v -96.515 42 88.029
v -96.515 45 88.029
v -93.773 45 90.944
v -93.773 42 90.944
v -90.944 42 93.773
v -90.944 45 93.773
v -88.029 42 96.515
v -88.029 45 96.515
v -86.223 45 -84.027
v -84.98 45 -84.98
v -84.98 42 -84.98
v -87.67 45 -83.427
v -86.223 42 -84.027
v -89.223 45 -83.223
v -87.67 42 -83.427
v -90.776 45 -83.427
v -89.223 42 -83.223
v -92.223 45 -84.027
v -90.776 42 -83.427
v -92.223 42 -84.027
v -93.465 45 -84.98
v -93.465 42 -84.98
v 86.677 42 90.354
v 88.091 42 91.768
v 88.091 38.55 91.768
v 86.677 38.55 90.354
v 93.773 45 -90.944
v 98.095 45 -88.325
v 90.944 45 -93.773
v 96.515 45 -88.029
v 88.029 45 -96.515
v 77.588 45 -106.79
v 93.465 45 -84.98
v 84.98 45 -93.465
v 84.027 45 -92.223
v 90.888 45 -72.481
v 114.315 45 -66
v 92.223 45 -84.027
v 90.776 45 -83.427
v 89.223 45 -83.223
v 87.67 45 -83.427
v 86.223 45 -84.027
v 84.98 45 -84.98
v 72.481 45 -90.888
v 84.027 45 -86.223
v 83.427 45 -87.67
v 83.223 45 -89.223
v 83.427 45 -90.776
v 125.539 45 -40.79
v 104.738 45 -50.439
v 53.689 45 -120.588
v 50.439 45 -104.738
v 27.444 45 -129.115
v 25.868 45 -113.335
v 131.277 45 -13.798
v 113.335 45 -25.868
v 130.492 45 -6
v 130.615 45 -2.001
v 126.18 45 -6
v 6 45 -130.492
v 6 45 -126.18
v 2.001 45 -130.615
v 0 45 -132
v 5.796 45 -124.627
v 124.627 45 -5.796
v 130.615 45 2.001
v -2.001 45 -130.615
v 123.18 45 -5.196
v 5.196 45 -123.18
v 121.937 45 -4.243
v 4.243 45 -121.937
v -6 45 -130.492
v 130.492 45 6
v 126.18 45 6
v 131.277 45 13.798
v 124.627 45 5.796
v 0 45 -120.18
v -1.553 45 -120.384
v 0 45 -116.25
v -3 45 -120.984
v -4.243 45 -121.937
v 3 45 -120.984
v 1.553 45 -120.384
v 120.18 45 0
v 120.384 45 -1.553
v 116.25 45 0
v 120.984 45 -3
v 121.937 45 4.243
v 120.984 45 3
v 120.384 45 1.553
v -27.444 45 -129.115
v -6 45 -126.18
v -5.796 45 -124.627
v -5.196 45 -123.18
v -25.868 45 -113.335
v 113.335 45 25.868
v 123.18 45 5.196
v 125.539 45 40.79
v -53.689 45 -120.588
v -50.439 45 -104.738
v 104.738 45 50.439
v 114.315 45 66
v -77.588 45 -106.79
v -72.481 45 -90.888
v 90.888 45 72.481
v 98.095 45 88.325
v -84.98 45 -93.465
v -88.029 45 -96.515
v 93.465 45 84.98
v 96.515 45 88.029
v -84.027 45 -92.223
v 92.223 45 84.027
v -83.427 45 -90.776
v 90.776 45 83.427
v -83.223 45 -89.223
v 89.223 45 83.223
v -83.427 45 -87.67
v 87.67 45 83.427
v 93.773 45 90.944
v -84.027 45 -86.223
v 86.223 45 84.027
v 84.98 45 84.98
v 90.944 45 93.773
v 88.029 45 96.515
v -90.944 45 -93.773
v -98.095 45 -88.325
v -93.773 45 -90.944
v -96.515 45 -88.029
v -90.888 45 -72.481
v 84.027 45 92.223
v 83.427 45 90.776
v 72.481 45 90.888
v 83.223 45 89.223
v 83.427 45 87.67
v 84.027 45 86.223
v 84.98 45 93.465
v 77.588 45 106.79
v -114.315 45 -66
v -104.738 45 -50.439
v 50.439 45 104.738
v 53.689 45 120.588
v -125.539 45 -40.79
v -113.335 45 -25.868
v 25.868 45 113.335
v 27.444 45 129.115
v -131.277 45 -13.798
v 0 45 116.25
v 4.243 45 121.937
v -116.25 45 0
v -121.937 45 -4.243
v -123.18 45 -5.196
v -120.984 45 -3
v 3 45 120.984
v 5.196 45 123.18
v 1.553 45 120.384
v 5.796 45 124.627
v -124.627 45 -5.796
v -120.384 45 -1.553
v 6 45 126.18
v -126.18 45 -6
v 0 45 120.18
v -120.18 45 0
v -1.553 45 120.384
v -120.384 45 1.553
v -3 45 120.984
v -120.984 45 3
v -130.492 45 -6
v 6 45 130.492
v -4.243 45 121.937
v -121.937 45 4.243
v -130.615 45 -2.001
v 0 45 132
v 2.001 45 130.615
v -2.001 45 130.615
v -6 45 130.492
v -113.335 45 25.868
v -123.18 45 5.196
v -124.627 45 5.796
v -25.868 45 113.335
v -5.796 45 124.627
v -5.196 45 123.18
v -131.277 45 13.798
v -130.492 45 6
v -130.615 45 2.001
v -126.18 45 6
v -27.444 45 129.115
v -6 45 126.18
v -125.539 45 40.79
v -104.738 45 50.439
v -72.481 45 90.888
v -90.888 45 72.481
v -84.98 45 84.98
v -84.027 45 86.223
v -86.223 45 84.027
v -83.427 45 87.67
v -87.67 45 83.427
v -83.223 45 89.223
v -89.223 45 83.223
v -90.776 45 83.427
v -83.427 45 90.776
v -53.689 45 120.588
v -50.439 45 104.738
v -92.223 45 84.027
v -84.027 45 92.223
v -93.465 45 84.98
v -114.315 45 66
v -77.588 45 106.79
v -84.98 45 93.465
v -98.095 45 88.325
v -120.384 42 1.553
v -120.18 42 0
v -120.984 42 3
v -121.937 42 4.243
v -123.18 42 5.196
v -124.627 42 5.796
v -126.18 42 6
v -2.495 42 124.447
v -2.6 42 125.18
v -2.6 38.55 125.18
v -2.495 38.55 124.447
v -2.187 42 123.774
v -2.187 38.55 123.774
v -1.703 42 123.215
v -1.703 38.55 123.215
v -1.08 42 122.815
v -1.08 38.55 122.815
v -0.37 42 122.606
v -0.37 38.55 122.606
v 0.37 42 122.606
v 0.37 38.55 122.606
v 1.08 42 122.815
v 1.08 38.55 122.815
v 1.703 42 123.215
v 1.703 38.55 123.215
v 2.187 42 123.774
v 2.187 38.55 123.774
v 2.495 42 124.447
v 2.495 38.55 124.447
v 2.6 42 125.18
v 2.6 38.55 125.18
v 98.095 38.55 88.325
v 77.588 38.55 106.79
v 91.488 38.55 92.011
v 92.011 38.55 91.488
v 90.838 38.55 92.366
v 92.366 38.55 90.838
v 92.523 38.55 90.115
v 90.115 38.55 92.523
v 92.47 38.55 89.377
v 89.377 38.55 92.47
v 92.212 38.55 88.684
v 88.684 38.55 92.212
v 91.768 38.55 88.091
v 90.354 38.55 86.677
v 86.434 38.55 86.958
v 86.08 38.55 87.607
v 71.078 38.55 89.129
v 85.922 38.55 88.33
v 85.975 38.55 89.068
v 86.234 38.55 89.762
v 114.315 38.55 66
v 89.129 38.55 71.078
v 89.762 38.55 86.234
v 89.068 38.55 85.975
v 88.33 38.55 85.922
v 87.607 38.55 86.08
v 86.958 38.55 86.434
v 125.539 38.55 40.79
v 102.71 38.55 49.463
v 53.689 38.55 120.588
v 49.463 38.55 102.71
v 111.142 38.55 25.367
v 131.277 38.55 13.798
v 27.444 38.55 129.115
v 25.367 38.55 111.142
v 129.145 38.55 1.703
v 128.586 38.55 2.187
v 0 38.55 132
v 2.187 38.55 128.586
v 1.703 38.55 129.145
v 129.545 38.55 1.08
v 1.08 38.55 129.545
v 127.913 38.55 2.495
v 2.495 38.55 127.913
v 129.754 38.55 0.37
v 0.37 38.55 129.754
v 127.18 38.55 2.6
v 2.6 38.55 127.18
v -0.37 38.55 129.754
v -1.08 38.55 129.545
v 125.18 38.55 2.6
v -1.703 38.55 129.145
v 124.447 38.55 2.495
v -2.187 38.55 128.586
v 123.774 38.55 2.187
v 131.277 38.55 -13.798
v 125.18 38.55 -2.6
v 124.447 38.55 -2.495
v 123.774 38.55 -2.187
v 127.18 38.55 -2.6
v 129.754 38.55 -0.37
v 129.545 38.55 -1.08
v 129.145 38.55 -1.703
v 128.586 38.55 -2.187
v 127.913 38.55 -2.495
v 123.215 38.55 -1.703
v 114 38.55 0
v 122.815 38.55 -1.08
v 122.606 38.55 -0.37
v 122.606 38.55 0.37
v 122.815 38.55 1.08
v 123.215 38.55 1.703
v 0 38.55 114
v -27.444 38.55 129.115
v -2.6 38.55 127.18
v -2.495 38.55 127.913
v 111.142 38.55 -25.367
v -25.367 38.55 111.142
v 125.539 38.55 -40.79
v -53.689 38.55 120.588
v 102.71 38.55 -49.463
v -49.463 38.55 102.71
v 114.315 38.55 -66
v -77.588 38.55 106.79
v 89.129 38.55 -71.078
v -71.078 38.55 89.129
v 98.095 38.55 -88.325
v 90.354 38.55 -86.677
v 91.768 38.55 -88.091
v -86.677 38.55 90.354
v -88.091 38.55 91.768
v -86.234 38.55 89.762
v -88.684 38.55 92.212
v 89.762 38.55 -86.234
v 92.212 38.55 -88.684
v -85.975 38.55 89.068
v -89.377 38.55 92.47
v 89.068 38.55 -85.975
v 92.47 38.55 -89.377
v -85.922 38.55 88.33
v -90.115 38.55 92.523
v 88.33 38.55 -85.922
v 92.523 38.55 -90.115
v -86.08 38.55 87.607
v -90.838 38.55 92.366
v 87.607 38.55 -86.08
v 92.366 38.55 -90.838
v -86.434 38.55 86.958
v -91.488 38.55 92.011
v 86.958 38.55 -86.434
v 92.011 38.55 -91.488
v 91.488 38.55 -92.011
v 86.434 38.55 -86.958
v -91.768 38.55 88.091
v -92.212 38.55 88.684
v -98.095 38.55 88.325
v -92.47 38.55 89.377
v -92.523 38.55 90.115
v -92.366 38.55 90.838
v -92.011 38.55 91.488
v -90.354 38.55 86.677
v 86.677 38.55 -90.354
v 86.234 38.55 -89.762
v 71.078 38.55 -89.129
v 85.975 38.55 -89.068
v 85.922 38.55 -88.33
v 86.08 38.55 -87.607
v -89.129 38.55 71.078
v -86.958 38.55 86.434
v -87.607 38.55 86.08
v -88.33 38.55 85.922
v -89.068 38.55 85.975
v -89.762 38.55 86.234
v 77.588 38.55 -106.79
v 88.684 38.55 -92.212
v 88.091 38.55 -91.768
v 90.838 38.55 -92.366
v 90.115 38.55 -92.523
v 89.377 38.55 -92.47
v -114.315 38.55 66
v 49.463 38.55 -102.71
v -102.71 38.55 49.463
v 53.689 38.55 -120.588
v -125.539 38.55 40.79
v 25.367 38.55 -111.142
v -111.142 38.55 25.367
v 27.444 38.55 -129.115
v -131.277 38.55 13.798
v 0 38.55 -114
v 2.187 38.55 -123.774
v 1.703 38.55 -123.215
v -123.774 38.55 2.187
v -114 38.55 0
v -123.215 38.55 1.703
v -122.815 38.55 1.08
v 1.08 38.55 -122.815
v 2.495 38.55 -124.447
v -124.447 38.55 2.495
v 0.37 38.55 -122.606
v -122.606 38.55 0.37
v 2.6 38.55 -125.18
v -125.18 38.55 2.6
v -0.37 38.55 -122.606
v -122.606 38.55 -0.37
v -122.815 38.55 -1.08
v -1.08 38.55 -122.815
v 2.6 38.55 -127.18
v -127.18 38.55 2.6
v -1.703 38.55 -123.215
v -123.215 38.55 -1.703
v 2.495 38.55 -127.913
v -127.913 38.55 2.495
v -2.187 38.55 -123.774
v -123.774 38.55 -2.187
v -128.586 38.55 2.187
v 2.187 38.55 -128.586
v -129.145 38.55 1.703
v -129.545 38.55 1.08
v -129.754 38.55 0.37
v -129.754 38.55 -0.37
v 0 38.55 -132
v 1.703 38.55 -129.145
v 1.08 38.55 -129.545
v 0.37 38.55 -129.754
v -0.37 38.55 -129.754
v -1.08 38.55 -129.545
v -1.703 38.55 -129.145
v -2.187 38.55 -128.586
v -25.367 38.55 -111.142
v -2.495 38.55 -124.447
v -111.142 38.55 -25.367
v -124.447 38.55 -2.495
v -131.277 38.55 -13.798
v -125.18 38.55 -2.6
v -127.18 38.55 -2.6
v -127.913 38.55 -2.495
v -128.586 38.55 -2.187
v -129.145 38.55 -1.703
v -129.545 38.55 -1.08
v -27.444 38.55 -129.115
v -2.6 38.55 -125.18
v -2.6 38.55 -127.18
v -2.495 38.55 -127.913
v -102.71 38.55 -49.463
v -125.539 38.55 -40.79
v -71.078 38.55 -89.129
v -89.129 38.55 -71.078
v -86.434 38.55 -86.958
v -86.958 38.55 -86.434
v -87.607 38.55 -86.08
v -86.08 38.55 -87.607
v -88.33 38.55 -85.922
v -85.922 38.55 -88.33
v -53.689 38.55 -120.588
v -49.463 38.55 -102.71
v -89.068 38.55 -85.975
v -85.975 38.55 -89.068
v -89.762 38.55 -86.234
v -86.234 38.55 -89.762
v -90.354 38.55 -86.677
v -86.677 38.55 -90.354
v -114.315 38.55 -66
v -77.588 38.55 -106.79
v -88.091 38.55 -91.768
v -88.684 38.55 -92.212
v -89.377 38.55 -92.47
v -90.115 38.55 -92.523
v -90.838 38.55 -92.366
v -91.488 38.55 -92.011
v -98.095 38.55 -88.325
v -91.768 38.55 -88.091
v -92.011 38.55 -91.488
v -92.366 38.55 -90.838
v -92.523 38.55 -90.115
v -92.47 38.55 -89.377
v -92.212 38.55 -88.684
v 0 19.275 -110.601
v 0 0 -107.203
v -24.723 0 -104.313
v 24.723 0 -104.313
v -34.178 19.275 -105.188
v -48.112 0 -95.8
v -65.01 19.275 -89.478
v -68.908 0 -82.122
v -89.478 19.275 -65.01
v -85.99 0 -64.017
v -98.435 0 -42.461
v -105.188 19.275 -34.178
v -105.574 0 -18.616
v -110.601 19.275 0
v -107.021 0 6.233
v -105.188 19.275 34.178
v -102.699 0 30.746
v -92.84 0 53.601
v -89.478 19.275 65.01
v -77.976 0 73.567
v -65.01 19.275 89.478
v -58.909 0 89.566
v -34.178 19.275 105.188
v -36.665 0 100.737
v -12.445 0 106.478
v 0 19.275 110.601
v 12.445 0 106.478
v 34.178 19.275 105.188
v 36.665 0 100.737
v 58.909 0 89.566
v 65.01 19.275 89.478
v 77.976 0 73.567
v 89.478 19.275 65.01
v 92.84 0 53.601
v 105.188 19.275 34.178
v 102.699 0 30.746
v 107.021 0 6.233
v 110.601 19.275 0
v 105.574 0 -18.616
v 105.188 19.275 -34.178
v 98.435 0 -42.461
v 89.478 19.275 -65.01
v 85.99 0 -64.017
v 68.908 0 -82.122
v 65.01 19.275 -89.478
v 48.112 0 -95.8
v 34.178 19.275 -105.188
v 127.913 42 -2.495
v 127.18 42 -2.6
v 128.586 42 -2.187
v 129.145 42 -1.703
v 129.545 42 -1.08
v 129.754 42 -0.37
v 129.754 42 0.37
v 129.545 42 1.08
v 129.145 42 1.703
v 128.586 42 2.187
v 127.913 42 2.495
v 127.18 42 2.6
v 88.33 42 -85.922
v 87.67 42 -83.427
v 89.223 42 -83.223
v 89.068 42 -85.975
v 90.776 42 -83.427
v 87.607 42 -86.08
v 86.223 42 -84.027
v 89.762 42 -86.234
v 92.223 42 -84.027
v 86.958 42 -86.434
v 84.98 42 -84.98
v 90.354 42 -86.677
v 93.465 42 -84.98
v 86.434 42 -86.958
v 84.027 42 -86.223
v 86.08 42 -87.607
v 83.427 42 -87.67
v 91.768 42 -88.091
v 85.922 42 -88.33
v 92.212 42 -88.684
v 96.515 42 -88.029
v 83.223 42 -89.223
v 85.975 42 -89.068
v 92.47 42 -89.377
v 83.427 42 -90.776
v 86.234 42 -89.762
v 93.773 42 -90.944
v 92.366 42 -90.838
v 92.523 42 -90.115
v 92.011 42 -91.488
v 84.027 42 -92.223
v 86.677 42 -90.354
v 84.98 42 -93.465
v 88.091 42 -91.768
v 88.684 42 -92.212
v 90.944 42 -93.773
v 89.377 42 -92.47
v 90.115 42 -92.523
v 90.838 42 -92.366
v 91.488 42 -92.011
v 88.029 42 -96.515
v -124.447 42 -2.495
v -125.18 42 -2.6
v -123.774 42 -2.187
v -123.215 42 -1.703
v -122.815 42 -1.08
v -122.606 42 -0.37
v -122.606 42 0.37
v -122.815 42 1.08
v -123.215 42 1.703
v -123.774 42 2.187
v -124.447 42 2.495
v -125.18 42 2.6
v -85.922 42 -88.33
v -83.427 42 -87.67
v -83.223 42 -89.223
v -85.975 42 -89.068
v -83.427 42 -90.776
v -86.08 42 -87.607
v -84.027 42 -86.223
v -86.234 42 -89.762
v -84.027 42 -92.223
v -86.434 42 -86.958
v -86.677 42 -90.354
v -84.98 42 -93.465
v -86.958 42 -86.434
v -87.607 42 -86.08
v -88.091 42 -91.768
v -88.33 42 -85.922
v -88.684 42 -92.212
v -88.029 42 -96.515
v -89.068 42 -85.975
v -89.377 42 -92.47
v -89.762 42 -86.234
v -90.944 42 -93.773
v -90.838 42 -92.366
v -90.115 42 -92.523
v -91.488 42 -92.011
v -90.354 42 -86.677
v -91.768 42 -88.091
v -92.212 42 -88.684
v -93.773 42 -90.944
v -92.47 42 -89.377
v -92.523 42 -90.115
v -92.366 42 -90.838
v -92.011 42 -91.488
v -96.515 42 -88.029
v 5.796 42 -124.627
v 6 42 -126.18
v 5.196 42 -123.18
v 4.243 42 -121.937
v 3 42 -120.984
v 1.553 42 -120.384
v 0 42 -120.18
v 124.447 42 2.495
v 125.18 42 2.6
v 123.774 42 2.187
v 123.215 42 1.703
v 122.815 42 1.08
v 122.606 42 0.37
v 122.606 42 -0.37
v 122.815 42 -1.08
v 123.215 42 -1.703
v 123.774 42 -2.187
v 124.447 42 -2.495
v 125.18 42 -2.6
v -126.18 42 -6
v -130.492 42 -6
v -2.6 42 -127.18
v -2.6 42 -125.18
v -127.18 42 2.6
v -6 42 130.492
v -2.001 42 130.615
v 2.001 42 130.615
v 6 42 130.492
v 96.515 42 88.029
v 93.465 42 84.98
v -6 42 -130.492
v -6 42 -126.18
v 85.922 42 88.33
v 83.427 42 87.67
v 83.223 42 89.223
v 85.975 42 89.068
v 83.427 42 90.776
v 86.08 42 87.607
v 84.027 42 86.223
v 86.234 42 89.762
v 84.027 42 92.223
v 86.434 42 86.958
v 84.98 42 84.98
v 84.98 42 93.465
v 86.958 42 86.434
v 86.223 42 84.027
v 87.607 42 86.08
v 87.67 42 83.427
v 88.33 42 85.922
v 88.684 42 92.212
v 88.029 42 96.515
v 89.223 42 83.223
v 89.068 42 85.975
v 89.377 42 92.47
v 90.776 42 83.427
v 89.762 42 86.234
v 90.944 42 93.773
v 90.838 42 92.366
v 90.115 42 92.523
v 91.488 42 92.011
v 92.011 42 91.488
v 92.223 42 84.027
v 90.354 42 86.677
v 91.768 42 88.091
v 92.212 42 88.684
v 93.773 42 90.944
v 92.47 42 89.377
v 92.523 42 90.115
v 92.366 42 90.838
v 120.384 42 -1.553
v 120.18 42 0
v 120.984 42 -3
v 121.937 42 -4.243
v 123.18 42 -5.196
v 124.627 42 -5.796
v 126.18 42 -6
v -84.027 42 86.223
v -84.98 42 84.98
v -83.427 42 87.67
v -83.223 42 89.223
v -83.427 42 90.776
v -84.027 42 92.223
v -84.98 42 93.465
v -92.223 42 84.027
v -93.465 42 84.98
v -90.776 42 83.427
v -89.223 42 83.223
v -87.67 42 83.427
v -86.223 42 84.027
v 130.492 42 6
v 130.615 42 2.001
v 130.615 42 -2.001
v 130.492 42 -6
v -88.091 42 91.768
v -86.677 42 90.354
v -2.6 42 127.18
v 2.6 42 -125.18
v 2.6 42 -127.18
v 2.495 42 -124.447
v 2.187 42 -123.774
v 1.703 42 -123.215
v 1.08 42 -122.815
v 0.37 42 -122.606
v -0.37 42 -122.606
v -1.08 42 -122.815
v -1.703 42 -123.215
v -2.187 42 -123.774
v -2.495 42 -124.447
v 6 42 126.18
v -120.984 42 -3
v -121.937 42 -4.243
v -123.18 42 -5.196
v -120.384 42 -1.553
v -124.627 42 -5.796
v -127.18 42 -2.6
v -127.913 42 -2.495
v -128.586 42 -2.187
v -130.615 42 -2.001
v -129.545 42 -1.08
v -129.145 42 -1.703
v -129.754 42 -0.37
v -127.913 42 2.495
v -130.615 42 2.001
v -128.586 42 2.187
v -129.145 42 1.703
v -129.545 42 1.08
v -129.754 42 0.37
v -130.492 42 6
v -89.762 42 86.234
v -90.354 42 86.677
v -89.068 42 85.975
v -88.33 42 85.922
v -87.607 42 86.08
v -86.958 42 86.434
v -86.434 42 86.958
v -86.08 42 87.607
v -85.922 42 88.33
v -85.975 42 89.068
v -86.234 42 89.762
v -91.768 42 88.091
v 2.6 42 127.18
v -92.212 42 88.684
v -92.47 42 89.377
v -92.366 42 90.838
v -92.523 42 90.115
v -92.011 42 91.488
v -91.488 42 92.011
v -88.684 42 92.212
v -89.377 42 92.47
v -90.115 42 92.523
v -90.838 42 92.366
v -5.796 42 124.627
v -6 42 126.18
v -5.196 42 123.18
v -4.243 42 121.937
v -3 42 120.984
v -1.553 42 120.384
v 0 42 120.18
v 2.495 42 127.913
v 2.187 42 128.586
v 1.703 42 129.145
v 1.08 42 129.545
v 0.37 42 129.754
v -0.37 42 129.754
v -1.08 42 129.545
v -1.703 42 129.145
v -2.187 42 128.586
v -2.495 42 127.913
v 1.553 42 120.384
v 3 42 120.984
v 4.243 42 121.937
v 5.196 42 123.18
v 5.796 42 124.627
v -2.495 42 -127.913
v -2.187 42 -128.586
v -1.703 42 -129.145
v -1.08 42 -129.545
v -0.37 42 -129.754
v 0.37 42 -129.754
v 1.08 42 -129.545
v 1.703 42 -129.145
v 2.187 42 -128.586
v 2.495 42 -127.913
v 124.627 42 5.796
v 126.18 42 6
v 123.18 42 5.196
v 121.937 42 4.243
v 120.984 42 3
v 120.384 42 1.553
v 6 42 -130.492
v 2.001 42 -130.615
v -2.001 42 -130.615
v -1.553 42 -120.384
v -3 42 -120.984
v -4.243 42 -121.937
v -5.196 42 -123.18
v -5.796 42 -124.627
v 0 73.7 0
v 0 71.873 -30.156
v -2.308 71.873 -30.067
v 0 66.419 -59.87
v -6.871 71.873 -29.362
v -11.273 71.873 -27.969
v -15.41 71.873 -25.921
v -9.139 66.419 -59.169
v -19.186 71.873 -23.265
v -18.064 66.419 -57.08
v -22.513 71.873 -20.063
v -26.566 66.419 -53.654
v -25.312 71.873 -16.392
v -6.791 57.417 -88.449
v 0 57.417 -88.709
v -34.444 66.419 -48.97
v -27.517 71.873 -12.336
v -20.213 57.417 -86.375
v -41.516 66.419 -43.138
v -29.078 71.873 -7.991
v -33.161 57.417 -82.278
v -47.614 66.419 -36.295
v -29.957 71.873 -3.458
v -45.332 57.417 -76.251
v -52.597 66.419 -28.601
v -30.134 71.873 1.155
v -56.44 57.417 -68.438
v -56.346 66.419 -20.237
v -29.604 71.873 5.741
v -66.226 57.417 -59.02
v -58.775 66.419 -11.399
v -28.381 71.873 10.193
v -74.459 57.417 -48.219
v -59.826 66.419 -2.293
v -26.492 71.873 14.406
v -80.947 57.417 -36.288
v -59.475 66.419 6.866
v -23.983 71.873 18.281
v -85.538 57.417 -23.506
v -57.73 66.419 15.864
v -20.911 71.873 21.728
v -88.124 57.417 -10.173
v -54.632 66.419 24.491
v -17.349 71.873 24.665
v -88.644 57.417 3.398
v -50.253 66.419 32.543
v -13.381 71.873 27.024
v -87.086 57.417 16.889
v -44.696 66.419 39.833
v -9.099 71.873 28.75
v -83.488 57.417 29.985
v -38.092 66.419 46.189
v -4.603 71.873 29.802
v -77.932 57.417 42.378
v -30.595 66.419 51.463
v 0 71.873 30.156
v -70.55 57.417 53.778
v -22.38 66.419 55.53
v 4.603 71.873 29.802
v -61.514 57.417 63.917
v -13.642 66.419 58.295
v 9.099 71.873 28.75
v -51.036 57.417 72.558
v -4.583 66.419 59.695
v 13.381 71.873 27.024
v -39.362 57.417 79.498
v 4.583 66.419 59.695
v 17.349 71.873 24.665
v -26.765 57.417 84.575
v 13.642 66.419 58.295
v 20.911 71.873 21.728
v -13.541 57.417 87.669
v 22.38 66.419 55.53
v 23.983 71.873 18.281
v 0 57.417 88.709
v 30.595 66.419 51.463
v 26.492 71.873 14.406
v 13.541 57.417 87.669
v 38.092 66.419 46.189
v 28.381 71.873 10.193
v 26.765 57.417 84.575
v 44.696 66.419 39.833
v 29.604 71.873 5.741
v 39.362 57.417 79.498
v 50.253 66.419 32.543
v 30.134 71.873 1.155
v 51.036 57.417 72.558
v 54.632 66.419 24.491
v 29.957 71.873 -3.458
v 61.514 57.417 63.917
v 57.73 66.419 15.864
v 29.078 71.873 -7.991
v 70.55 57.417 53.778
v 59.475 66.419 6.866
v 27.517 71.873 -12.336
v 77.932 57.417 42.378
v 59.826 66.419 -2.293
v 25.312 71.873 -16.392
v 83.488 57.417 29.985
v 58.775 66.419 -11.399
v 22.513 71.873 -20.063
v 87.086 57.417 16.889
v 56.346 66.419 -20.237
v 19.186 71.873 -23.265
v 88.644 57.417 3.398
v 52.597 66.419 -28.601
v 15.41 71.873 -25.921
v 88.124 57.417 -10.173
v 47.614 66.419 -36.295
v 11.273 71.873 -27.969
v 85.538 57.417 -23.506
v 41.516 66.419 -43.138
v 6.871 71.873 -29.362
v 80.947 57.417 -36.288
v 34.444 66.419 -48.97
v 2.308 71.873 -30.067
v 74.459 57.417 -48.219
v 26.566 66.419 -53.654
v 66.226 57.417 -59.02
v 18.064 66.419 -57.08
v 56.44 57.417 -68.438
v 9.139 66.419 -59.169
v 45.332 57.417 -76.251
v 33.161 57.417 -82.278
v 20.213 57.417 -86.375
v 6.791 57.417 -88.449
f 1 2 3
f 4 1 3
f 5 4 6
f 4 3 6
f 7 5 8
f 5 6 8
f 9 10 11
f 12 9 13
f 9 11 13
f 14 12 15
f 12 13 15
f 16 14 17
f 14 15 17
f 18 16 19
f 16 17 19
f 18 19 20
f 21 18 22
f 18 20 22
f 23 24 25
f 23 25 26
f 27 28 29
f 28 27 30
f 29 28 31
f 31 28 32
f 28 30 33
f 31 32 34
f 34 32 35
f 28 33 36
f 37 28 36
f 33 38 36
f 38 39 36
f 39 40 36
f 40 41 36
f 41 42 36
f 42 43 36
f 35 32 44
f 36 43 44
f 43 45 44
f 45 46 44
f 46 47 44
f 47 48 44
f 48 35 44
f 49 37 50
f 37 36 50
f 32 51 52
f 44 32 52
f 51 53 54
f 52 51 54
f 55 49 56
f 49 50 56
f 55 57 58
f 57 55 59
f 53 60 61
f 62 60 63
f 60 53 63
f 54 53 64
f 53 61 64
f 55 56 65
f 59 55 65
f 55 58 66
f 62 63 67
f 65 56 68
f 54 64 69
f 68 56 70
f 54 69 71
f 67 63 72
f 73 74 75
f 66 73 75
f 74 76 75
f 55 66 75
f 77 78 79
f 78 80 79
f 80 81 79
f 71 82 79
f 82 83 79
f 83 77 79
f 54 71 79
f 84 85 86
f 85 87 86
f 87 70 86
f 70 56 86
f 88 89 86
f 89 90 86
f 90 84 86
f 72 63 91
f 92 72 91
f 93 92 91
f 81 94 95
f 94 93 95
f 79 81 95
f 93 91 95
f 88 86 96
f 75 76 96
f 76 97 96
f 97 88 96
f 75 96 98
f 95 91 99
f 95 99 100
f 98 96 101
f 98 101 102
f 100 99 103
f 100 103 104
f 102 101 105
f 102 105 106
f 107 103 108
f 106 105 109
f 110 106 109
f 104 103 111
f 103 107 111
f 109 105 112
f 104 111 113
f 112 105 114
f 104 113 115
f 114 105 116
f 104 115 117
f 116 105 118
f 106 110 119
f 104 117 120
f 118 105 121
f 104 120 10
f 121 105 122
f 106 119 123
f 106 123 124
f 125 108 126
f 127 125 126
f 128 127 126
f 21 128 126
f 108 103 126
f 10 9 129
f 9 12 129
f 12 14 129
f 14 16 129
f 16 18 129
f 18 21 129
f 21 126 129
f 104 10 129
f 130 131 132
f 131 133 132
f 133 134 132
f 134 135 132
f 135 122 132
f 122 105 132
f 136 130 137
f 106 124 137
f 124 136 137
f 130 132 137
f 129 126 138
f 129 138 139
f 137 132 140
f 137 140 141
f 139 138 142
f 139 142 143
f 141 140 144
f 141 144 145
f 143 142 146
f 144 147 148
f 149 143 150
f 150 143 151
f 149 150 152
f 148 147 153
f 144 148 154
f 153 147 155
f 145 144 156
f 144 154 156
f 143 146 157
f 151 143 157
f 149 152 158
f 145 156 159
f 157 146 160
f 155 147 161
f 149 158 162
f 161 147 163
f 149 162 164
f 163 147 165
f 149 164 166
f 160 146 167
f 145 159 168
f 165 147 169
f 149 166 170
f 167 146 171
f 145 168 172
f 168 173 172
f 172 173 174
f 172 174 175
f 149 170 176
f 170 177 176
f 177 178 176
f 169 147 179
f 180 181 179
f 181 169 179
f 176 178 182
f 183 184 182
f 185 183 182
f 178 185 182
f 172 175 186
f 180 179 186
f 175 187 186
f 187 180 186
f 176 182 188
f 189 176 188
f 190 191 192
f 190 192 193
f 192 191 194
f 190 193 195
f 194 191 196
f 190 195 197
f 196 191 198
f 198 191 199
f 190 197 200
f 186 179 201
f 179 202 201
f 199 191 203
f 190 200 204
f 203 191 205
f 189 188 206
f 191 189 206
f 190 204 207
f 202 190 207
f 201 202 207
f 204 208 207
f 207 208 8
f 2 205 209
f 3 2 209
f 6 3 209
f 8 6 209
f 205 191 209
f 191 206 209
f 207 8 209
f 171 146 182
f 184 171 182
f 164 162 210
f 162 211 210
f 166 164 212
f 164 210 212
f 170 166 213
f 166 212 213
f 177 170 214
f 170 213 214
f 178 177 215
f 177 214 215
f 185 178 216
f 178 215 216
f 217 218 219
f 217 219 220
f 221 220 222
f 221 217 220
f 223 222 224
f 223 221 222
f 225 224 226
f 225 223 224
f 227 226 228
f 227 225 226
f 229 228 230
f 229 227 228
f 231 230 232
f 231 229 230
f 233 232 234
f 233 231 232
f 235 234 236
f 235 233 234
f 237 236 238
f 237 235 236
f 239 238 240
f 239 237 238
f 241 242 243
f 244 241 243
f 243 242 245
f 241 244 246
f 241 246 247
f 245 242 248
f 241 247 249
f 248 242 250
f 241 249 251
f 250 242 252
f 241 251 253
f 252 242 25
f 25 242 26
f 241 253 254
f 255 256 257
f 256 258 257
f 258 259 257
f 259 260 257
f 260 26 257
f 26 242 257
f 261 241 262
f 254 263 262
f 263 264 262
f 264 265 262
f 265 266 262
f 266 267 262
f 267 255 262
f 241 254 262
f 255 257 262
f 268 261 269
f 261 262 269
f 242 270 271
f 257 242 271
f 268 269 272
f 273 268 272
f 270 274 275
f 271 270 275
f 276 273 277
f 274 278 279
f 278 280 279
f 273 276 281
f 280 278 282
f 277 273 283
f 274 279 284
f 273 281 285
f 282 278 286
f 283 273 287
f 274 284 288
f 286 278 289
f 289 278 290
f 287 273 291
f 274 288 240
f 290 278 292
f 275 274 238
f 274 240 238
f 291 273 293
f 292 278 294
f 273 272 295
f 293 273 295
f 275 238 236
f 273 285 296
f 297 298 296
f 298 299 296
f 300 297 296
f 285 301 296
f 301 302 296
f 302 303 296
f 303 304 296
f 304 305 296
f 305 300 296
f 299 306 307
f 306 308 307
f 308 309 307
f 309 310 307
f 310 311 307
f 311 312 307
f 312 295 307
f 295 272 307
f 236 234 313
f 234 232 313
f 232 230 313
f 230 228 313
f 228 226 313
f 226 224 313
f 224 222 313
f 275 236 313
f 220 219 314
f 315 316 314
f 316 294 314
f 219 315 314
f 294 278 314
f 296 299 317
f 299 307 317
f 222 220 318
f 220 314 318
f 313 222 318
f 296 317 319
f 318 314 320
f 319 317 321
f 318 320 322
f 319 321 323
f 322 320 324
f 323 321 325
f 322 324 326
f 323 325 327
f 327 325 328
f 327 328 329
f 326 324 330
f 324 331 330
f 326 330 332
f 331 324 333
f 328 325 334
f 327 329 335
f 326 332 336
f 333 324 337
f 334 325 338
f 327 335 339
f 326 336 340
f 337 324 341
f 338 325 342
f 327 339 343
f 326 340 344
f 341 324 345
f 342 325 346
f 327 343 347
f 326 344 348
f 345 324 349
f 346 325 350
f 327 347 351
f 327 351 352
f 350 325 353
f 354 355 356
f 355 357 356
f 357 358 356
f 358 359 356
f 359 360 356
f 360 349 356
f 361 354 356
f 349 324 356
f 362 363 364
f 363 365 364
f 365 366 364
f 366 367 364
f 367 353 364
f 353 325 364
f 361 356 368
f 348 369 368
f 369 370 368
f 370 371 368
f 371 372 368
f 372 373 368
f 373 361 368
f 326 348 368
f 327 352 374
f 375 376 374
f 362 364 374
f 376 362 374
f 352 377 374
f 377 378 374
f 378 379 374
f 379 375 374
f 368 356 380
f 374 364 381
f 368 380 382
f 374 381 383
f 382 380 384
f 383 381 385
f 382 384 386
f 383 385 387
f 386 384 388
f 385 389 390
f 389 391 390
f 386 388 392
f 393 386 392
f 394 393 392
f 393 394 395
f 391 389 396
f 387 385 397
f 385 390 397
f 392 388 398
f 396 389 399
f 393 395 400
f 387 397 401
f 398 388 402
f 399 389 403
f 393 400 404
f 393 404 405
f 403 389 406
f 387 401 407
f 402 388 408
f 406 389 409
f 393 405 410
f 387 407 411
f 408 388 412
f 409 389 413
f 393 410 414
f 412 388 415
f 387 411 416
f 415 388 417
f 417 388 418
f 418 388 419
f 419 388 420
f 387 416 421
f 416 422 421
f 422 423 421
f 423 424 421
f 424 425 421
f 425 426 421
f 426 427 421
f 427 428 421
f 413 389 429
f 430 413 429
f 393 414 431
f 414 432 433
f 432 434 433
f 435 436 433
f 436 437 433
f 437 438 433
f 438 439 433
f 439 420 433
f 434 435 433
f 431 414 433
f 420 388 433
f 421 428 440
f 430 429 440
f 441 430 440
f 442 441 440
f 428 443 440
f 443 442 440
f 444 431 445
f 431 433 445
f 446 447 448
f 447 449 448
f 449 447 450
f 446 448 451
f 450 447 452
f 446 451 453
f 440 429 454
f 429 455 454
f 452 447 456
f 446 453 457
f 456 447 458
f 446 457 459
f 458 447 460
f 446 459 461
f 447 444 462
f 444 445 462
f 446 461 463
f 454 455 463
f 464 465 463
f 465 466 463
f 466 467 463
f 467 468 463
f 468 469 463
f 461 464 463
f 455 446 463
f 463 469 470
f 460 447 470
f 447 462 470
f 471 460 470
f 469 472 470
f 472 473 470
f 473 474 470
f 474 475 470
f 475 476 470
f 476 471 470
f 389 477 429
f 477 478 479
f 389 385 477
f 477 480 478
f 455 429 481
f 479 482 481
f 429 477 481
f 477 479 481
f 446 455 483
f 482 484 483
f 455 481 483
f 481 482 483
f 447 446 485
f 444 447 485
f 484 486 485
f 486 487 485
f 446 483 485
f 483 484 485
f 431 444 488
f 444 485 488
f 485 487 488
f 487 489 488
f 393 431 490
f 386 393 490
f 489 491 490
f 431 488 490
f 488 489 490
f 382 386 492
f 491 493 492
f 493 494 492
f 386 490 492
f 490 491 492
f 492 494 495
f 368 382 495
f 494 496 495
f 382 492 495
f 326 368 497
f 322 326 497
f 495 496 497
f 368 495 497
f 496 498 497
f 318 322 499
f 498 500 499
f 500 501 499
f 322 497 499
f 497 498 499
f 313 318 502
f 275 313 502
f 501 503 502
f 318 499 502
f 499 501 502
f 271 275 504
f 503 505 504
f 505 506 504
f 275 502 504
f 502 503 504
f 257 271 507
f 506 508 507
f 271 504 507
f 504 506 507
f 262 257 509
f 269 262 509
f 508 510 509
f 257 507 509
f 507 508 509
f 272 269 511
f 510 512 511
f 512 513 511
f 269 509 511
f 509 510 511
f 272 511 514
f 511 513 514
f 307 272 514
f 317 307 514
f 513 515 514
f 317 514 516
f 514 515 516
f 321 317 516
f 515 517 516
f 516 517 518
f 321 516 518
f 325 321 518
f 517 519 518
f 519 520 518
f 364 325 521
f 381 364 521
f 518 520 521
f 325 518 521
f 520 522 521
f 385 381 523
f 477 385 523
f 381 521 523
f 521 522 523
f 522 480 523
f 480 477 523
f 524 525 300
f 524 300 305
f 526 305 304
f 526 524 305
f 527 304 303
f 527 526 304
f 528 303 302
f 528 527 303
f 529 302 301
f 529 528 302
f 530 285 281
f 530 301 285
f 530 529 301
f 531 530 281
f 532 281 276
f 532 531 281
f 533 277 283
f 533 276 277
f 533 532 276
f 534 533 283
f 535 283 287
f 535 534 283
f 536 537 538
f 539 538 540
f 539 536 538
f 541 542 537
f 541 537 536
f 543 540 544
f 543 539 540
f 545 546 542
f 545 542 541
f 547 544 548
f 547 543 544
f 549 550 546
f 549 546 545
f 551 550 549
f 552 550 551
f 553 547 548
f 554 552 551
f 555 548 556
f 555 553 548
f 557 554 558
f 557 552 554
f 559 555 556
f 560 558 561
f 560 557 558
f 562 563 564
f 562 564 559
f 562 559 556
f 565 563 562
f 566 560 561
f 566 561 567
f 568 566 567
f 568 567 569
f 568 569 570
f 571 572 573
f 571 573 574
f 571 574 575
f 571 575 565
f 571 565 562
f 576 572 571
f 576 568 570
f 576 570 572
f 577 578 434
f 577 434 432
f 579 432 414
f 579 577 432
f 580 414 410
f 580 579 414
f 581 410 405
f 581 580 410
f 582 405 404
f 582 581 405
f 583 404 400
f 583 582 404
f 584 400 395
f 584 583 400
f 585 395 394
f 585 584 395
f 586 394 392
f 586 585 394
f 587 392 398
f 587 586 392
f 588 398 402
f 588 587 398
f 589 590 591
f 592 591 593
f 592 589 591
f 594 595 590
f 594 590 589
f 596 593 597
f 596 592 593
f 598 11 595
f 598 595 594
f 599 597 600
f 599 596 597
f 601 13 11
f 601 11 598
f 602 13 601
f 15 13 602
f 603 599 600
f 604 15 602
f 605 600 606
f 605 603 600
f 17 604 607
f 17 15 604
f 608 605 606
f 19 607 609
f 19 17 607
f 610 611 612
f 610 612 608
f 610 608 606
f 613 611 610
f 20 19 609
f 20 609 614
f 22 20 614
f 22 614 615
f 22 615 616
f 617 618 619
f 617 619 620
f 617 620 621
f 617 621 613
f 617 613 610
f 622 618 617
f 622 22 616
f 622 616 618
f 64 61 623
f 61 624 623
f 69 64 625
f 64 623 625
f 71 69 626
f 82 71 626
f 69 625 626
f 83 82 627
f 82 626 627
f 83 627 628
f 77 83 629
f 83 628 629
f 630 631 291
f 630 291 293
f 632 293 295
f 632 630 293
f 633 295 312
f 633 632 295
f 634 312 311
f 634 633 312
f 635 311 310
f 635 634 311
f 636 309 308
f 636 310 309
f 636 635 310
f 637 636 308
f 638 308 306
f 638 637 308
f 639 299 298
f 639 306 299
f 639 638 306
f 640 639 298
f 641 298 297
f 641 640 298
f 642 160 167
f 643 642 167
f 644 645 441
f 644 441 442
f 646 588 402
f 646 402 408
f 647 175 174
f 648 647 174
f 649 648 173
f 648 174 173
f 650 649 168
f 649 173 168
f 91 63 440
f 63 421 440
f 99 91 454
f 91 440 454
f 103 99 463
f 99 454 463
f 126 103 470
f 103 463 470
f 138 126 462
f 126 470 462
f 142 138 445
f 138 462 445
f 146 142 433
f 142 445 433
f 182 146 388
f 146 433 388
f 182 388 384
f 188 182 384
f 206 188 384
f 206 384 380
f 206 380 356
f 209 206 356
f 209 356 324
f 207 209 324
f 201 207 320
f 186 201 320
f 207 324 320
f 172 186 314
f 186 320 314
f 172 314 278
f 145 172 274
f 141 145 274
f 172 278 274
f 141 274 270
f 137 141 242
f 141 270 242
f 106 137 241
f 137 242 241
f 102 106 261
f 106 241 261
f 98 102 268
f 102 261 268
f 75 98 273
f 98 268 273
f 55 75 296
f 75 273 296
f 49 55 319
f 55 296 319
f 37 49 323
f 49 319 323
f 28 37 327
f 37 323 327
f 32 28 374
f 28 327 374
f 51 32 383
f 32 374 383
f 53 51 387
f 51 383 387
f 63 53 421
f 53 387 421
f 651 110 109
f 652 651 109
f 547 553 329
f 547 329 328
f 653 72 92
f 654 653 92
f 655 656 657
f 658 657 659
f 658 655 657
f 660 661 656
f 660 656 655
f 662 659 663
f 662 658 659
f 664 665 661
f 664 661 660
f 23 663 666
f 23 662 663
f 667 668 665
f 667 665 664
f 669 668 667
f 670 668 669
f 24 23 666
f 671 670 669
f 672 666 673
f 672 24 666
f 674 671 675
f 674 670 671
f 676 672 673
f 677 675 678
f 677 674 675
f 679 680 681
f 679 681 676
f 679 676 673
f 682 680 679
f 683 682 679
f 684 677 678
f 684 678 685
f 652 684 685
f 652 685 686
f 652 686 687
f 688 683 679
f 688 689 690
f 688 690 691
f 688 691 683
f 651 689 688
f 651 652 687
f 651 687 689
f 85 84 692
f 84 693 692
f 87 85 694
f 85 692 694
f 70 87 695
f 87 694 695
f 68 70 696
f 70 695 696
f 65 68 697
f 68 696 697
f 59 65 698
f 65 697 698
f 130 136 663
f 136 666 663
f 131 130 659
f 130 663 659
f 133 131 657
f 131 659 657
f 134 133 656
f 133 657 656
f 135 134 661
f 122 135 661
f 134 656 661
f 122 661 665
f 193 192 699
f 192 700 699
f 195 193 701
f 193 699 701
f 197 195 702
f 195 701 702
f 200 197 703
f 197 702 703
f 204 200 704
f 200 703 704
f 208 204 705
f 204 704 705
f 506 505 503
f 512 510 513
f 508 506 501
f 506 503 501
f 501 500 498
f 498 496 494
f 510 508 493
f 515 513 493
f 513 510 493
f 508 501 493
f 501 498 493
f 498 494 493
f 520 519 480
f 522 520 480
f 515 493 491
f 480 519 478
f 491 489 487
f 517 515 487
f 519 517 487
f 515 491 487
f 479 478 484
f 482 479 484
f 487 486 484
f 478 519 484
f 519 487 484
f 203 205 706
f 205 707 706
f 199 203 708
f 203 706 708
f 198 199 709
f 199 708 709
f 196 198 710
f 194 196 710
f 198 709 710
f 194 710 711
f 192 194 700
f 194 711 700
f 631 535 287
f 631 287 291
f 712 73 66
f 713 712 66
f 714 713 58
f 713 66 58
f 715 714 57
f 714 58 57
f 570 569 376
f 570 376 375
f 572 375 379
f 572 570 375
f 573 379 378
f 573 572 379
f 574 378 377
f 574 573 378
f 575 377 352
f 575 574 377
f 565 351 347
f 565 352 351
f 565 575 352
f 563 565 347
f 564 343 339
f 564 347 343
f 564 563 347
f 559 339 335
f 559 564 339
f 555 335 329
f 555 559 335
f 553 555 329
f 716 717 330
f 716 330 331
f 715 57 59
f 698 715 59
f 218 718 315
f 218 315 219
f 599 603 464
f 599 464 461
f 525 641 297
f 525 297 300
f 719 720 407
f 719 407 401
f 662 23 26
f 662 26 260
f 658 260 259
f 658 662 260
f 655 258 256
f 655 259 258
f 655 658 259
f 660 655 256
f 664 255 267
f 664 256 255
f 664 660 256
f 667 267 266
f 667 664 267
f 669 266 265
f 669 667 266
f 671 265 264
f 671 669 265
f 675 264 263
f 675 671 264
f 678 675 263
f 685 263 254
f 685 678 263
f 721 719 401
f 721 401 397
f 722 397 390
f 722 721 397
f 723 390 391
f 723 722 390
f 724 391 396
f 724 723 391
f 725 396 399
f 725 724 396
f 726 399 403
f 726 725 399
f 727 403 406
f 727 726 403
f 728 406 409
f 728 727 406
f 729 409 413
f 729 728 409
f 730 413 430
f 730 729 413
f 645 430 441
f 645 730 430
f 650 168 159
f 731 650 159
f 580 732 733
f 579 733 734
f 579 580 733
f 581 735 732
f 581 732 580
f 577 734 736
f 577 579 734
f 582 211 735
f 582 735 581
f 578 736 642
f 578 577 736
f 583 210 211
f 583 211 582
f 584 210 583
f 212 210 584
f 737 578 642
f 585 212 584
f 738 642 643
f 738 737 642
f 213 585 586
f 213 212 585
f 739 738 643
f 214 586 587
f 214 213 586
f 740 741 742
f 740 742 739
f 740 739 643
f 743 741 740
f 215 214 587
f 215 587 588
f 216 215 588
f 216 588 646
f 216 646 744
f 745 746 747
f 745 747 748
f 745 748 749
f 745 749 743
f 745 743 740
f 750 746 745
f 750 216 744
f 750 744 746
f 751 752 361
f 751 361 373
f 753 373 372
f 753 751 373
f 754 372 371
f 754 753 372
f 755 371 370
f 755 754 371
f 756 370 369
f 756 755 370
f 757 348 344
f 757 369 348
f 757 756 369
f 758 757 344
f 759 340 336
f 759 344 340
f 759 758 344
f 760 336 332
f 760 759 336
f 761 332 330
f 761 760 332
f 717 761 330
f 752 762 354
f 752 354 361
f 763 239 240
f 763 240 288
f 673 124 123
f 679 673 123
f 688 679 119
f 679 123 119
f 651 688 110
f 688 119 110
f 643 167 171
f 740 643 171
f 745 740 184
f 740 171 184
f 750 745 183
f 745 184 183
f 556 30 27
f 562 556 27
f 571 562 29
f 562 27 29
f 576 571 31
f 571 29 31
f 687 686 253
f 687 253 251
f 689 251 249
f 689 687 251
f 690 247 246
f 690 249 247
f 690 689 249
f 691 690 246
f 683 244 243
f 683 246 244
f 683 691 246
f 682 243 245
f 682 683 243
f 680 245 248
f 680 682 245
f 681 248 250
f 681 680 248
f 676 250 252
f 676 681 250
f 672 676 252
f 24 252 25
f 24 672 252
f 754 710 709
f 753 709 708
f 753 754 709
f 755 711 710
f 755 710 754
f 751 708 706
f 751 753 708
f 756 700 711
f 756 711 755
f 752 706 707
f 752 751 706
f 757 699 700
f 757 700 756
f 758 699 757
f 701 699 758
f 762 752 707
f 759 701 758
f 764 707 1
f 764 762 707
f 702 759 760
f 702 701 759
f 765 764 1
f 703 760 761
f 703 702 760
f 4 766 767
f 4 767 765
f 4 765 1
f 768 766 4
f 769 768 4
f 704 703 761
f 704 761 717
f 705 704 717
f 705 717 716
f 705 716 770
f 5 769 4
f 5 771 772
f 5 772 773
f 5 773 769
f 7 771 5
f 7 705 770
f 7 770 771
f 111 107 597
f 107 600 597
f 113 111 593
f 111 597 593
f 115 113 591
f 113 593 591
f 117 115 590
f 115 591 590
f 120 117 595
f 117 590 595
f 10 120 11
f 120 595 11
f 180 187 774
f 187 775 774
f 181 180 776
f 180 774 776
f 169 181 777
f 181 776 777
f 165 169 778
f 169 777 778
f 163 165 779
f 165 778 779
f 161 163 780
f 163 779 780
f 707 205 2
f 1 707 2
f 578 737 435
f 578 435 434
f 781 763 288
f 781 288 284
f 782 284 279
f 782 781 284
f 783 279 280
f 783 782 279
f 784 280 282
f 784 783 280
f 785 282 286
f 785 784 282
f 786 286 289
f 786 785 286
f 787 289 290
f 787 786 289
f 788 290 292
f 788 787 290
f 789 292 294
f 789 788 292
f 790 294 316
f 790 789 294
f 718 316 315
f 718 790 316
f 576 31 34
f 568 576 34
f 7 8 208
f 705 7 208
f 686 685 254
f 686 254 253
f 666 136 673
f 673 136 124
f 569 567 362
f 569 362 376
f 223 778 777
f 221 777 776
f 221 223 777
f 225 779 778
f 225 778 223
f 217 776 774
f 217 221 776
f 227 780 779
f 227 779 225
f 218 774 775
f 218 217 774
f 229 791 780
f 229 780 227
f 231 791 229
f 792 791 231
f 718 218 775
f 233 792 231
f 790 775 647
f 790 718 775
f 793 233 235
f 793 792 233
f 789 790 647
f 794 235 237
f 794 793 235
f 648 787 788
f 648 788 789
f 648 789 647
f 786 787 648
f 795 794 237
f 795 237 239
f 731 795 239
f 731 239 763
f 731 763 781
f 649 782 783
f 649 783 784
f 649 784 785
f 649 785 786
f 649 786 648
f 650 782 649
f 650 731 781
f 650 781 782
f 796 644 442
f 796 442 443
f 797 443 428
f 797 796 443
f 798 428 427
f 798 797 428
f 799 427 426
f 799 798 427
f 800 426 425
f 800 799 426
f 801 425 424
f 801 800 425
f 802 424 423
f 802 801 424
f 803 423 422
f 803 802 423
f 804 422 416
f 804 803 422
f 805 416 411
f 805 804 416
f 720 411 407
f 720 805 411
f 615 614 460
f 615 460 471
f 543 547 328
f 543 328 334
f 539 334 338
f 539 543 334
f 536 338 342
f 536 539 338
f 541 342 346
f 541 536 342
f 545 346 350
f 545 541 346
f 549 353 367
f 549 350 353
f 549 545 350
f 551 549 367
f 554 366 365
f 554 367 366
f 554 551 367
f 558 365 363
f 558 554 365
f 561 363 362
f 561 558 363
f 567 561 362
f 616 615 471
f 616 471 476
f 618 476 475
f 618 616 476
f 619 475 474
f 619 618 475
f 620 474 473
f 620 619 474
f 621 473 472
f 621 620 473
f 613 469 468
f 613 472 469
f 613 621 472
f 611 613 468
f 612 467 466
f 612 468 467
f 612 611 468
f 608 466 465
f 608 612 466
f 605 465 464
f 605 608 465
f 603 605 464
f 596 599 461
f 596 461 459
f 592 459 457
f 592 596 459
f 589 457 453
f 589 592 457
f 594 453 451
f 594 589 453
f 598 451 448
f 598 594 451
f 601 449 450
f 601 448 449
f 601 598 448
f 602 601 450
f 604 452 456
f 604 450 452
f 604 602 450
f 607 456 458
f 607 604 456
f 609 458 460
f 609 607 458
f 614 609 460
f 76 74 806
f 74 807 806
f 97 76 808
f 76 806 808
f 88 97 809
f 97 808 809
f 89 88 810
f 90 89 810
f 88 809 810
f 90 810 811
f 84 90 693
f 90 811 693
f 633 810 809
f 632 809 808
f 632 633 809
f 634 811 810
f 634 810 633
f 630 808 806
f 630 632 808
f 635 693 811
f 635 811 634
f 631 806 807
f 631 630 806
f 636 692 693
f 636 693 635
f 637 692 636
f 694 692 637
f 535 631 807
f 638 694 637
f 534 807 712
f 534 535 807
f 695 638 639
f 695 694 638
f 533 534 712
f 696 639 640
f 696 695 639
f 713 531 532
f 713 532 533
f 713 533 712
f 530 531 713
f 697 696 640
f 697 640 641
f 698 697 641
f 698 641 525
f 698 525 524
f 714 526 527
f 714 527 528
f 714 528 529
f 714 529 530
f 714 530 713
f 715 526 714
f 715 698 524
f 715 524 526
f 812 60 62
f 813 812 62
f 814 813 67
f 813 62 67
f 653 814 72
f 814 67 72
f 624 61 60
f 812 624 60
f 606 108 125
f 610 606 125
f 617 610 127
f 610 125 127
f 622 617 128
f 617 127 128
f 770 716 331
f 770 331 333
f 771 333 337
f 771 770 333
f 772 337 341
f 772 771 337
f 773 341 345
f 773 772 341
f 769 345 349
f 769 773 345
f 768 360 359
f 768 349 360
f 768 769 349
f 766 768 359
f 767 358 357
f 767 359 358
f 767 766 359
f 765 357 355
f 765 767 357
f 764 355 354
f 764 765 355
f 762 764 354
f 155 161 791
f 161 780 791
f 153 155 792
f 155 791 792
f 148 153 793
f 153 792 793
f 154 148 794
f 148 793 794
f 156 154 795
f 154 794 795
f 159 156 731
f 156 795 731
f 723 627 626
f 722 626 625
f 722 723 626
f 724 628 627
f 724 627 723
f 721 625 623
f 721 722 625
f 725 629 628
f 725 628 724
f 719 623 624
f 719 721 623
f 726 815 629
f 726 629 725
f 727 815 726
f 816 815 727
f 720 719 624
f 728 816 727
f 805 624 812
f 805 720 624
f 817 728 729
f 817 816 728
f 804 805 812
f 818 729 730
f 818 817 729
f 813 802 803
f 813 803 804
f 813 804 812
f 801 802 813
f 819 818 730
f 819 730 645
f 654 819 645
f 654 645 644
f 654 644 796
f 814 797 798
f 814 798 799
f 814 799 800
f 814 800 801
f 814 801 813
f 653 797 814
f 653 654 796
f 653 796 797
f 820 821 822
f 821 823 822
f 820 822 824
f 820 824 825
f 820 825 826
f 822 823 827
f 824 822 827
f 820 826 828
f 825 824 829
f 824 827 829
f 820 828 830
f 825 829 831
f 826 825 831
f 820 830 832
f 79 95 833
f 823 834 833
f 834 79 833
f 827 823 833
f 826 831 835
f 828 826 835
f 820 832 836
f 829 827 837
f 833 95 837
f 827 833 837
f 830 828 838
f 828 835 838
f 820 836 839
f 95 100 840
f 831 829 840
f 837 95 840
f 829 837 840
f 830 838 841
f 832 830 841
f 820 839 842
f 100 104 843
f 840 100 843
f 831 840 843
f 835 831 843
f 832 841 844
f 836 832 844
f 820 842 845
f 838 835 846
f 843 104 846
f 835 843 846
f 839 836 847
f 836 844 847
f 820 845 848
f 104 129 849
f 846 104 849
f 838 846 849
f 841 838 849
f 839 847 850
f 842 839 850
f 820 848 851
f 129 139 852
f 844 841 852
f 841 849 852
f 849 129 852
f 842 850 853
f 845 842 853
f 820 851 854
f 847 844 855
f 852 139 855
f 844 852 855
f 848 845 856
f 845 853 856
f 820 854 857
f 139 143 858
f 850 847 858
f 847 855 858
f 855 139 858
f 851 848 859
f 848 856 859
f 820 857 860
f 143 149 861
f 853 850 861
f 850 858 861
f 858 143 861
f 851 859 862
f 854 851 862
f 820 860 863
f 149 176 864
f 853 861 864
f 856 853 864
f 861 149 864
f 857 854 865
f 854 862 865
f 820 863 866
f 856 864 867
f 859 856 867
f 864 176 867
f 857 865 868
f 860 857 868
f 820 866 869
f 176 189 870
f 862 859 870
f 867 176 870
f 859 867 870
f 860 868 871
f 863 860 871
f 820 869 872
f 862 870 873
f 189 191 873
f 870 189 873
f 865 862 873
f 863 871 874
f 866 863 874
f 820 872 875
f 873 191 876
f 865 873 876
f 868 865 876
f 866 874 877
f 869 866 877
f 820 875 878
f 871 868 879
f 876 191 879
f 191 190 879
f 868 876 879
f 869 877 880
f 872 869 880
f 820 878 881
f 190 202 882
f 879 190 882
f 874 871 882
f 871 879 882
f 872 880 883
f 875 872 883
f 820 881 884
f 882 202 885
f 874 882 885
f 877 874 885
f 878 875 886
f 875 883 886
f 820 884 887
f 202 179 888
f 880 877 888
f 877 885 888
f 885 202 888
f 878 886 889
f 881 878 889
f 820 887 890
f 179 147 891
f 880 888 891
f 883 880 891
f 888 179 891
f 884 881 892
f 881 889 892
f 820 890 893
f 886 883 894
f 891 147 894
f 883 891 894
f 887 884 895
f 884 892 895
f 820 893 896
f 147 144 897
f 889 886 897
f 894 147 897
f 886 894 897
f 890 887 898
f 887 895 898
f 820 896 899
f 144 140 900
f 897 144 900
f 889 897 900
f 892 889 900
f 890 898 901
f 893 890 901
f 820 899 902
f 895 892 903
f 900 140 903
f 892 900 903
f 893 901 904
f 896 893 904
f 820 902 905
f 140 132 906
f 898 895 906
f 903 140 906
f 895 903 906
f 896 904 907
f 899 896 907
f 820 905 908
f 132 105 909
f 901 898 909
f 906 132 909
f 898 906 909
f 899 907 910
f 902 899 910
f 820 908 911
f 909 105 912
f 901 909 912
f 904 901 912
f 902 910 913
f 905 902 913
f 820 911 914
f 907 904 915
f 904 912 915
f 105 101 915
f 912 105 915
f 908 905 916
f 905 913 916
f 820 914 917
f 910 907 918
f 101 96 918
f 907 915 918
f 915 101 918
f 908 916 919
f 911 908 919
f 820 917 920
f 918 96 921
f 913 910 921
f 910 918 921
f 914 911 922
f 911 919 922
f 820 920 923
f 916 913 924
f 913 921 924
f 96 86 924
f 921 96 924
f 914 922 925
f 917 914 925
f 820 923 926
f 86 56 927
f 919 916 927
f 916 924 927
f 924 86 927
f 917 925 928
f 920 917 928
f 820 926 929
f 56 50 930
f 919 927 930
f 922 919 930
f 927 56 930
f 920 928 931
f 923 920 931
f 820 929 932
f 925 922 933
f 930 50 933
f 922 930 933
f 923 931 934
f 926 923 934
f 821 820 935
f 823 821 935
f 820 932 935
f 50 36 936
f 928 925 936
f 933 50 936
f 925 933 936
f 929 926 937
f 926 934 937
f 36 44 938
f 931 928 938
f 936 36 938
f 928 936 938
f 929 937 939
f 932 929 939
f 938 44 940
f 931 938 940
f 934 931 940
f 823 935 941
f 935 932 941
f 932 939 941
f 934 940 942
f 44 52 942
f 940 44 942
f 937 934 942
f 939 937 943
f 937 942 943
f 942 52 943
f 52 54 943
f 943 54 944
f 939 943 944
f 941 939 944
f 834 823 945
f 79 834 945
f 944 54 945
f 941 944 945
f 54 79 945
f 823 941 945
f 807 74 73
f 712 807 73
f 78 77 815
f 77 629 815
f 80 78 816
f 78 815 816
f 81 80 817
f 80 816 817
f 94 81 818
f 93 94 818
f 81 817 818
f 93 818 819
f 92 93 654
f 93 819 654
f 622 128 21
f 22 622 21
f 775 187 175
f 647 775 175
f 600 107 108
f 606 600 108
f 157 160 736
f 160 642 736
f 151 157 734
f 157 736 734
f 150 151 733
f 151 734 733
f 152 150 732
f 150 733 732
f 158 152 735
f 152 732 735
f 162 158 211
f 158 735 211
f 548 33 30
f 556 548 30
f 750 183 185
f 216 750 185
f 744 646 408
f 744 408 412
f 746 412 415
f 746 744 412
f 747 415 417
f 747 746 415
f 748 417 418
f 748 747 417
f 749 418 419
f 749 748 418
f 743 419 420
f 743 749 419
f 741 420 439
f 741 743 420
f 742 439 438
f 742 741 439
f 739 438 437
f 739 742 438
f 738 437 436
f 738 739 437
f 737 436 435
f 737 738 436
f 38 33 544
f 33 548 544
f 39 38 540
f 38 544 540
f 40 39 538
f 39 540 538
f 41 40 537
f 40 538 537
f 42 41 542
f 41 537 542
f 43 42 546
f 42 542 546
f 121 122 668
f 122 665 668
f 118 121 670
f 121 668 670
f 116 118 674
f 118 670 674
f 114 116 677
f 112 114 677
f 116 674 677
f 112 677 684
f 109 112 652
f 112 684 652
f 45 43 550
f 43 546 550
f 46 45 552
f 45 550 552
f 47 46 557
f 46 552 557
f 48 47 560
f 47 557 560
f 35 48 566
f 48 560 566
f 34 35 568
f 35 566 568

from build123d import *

# Parameters (mm, degrees)
CUT_EXTRUDE1_DEPTH       = 3
FILLET1_R                = 6
CUT_EXTRUDE2_DEPTH       = 192.342624629
CIRPATTERN2_COUNT        = 8
FILLET1_OF_CIRPATTERN2_R = 6


with BuildPart() as part:
    # Sketch1 → Revolve1 (revolve)
    with BuildSketch(Plane.XY, mode=Mode.PRIVATE) as revolve1_sk:
        with BuildLine():
            Line((116.25, 45), (132, 45))
            Line((132, 45), (132, 38.55))
            Line((132, 38.55), (114, 38.55))
            Line((114, 38.55), (107.202594894, 0))
            Line((107.202594894, 0), (0, 0))
            Line((0, 0), (0, 73.7))
            ThreePointArc((0, 73.7), (59.870177259, 66.418880012), (116.25, 45))
        make_face()
    revolve(revolve1_sk.sketch.rotate(Axis((0, 0, 0), (0, 1, 0)), 90), axis=Axis((0, 0, 0), (0, 1, 0)))

    # Sketch2 → Cut-Extrude1 (cut)
    with BuildSketch(Plane(origin=(0, 45, 0), x_dir=(1, 0, 0), z_dir=(0, 1, 0))):
        with BuildLine():
            Line((130.492133479, 6), (120.18, 6))
            Line((120.18, 6), (120.18, -6))
            Line((120.18, -6), (130.492133479, -6))
            ThreePointArc((130.492133479, -6), (130.63, 0), (130.492133479, 6))
        make_face()
    cut_extrude1 = extrude(amount=-CUT_EXTRUDE1_DEPTH, mode=Mode.SUBTRACT)

    # Fillet1
    fillet1_edges = [part.edges().sort_by_distance(p)[0] for p in [
        (120.18, 43.5, 6),
        (120.18, 43.5, -6),
    ]]
    fillet(fillet1_edges, radius=FILLET1_R - 0.0001)  # a hair under: the kernel refuses the full size

    # Sketch3 → Cut-Extrude2 (cut, through all)
    with BuildSketch(Plane(origin=(0, 42, 0), x_dir=(1, 0, 0), z_dir=(0, 1, 0))):
        with BuildLine():
            Line((125.18, 2.6), (127.18, 2.6))
            ThreePointArc((127.18, 2.6), (129.78, 0), (127.18, -2.6))
            Line((127.18, -2.6), (125.18, -2.6))
            ThreePointArc((125.18, -2.6), (122.58, 0), (125.18, 2.6))
        make_face()
    cut_extrude2 = extrude(amount=-CUT_EXTRUDE2_DEPTH, mode=Mode.SUBTRACT)

    # CirPattern2: Cut-Extrude1, Cut-Extrude2 ×8 about axis
    cirpattern2_axis = Axis((0, 0, 0), (0, 1, 0))
    add([cut_extrude1.rotate(cirpattern2_axis, i * 360 / CIRPATTERN2_COUNT) for i in range(1, CIRPATTERN2_COUNT)], mode=Mode.SUBTRACT)
    add([cut_extrude2.rotate(cirpattern2_axis, i * 360 / CIRPATTERN2_COUNT) for i in range(1, CIRPATTERN2_COUNT)], mode=Mode.SUBTRACT)

    # Fillet1 of CirPattern2
    fillet1_of_cirpattern2_edges = [part.edges().sort_by_distance(p)[0] for p in [
        (89.22273365, 43.5, -80.737452276),
        (80.737452276, 43.5, -89.22273365),
        (6, 43.5, -120.18),
        (-6, 43.5, -120.18),
        (-80.737452276, 43.5, -89.22273365),
        (-89.22273365, 43.5, -80.737452276),
        (-120.18, 43.5, -6),
        (-120.18, 43.5, 6),
        (-89.22273365, 43.5, 80.737452276),
        (-80.737452276, 43.5, 89.22273365),
        (-6, 43.5, 120.18),
        (6, 43.5, 120.18),
        (80.737452276, 43.5, 89.22273365),
        (89.22273365, 43.5, 80.737452276),
    ]]
    fillet(fillet1_of_cirpattern2_edges, radius=FILLET1_OF_CIRPATTERN2_R - 0.0001)  # a hair under: the kernel refuses the full size


solid = part.part
